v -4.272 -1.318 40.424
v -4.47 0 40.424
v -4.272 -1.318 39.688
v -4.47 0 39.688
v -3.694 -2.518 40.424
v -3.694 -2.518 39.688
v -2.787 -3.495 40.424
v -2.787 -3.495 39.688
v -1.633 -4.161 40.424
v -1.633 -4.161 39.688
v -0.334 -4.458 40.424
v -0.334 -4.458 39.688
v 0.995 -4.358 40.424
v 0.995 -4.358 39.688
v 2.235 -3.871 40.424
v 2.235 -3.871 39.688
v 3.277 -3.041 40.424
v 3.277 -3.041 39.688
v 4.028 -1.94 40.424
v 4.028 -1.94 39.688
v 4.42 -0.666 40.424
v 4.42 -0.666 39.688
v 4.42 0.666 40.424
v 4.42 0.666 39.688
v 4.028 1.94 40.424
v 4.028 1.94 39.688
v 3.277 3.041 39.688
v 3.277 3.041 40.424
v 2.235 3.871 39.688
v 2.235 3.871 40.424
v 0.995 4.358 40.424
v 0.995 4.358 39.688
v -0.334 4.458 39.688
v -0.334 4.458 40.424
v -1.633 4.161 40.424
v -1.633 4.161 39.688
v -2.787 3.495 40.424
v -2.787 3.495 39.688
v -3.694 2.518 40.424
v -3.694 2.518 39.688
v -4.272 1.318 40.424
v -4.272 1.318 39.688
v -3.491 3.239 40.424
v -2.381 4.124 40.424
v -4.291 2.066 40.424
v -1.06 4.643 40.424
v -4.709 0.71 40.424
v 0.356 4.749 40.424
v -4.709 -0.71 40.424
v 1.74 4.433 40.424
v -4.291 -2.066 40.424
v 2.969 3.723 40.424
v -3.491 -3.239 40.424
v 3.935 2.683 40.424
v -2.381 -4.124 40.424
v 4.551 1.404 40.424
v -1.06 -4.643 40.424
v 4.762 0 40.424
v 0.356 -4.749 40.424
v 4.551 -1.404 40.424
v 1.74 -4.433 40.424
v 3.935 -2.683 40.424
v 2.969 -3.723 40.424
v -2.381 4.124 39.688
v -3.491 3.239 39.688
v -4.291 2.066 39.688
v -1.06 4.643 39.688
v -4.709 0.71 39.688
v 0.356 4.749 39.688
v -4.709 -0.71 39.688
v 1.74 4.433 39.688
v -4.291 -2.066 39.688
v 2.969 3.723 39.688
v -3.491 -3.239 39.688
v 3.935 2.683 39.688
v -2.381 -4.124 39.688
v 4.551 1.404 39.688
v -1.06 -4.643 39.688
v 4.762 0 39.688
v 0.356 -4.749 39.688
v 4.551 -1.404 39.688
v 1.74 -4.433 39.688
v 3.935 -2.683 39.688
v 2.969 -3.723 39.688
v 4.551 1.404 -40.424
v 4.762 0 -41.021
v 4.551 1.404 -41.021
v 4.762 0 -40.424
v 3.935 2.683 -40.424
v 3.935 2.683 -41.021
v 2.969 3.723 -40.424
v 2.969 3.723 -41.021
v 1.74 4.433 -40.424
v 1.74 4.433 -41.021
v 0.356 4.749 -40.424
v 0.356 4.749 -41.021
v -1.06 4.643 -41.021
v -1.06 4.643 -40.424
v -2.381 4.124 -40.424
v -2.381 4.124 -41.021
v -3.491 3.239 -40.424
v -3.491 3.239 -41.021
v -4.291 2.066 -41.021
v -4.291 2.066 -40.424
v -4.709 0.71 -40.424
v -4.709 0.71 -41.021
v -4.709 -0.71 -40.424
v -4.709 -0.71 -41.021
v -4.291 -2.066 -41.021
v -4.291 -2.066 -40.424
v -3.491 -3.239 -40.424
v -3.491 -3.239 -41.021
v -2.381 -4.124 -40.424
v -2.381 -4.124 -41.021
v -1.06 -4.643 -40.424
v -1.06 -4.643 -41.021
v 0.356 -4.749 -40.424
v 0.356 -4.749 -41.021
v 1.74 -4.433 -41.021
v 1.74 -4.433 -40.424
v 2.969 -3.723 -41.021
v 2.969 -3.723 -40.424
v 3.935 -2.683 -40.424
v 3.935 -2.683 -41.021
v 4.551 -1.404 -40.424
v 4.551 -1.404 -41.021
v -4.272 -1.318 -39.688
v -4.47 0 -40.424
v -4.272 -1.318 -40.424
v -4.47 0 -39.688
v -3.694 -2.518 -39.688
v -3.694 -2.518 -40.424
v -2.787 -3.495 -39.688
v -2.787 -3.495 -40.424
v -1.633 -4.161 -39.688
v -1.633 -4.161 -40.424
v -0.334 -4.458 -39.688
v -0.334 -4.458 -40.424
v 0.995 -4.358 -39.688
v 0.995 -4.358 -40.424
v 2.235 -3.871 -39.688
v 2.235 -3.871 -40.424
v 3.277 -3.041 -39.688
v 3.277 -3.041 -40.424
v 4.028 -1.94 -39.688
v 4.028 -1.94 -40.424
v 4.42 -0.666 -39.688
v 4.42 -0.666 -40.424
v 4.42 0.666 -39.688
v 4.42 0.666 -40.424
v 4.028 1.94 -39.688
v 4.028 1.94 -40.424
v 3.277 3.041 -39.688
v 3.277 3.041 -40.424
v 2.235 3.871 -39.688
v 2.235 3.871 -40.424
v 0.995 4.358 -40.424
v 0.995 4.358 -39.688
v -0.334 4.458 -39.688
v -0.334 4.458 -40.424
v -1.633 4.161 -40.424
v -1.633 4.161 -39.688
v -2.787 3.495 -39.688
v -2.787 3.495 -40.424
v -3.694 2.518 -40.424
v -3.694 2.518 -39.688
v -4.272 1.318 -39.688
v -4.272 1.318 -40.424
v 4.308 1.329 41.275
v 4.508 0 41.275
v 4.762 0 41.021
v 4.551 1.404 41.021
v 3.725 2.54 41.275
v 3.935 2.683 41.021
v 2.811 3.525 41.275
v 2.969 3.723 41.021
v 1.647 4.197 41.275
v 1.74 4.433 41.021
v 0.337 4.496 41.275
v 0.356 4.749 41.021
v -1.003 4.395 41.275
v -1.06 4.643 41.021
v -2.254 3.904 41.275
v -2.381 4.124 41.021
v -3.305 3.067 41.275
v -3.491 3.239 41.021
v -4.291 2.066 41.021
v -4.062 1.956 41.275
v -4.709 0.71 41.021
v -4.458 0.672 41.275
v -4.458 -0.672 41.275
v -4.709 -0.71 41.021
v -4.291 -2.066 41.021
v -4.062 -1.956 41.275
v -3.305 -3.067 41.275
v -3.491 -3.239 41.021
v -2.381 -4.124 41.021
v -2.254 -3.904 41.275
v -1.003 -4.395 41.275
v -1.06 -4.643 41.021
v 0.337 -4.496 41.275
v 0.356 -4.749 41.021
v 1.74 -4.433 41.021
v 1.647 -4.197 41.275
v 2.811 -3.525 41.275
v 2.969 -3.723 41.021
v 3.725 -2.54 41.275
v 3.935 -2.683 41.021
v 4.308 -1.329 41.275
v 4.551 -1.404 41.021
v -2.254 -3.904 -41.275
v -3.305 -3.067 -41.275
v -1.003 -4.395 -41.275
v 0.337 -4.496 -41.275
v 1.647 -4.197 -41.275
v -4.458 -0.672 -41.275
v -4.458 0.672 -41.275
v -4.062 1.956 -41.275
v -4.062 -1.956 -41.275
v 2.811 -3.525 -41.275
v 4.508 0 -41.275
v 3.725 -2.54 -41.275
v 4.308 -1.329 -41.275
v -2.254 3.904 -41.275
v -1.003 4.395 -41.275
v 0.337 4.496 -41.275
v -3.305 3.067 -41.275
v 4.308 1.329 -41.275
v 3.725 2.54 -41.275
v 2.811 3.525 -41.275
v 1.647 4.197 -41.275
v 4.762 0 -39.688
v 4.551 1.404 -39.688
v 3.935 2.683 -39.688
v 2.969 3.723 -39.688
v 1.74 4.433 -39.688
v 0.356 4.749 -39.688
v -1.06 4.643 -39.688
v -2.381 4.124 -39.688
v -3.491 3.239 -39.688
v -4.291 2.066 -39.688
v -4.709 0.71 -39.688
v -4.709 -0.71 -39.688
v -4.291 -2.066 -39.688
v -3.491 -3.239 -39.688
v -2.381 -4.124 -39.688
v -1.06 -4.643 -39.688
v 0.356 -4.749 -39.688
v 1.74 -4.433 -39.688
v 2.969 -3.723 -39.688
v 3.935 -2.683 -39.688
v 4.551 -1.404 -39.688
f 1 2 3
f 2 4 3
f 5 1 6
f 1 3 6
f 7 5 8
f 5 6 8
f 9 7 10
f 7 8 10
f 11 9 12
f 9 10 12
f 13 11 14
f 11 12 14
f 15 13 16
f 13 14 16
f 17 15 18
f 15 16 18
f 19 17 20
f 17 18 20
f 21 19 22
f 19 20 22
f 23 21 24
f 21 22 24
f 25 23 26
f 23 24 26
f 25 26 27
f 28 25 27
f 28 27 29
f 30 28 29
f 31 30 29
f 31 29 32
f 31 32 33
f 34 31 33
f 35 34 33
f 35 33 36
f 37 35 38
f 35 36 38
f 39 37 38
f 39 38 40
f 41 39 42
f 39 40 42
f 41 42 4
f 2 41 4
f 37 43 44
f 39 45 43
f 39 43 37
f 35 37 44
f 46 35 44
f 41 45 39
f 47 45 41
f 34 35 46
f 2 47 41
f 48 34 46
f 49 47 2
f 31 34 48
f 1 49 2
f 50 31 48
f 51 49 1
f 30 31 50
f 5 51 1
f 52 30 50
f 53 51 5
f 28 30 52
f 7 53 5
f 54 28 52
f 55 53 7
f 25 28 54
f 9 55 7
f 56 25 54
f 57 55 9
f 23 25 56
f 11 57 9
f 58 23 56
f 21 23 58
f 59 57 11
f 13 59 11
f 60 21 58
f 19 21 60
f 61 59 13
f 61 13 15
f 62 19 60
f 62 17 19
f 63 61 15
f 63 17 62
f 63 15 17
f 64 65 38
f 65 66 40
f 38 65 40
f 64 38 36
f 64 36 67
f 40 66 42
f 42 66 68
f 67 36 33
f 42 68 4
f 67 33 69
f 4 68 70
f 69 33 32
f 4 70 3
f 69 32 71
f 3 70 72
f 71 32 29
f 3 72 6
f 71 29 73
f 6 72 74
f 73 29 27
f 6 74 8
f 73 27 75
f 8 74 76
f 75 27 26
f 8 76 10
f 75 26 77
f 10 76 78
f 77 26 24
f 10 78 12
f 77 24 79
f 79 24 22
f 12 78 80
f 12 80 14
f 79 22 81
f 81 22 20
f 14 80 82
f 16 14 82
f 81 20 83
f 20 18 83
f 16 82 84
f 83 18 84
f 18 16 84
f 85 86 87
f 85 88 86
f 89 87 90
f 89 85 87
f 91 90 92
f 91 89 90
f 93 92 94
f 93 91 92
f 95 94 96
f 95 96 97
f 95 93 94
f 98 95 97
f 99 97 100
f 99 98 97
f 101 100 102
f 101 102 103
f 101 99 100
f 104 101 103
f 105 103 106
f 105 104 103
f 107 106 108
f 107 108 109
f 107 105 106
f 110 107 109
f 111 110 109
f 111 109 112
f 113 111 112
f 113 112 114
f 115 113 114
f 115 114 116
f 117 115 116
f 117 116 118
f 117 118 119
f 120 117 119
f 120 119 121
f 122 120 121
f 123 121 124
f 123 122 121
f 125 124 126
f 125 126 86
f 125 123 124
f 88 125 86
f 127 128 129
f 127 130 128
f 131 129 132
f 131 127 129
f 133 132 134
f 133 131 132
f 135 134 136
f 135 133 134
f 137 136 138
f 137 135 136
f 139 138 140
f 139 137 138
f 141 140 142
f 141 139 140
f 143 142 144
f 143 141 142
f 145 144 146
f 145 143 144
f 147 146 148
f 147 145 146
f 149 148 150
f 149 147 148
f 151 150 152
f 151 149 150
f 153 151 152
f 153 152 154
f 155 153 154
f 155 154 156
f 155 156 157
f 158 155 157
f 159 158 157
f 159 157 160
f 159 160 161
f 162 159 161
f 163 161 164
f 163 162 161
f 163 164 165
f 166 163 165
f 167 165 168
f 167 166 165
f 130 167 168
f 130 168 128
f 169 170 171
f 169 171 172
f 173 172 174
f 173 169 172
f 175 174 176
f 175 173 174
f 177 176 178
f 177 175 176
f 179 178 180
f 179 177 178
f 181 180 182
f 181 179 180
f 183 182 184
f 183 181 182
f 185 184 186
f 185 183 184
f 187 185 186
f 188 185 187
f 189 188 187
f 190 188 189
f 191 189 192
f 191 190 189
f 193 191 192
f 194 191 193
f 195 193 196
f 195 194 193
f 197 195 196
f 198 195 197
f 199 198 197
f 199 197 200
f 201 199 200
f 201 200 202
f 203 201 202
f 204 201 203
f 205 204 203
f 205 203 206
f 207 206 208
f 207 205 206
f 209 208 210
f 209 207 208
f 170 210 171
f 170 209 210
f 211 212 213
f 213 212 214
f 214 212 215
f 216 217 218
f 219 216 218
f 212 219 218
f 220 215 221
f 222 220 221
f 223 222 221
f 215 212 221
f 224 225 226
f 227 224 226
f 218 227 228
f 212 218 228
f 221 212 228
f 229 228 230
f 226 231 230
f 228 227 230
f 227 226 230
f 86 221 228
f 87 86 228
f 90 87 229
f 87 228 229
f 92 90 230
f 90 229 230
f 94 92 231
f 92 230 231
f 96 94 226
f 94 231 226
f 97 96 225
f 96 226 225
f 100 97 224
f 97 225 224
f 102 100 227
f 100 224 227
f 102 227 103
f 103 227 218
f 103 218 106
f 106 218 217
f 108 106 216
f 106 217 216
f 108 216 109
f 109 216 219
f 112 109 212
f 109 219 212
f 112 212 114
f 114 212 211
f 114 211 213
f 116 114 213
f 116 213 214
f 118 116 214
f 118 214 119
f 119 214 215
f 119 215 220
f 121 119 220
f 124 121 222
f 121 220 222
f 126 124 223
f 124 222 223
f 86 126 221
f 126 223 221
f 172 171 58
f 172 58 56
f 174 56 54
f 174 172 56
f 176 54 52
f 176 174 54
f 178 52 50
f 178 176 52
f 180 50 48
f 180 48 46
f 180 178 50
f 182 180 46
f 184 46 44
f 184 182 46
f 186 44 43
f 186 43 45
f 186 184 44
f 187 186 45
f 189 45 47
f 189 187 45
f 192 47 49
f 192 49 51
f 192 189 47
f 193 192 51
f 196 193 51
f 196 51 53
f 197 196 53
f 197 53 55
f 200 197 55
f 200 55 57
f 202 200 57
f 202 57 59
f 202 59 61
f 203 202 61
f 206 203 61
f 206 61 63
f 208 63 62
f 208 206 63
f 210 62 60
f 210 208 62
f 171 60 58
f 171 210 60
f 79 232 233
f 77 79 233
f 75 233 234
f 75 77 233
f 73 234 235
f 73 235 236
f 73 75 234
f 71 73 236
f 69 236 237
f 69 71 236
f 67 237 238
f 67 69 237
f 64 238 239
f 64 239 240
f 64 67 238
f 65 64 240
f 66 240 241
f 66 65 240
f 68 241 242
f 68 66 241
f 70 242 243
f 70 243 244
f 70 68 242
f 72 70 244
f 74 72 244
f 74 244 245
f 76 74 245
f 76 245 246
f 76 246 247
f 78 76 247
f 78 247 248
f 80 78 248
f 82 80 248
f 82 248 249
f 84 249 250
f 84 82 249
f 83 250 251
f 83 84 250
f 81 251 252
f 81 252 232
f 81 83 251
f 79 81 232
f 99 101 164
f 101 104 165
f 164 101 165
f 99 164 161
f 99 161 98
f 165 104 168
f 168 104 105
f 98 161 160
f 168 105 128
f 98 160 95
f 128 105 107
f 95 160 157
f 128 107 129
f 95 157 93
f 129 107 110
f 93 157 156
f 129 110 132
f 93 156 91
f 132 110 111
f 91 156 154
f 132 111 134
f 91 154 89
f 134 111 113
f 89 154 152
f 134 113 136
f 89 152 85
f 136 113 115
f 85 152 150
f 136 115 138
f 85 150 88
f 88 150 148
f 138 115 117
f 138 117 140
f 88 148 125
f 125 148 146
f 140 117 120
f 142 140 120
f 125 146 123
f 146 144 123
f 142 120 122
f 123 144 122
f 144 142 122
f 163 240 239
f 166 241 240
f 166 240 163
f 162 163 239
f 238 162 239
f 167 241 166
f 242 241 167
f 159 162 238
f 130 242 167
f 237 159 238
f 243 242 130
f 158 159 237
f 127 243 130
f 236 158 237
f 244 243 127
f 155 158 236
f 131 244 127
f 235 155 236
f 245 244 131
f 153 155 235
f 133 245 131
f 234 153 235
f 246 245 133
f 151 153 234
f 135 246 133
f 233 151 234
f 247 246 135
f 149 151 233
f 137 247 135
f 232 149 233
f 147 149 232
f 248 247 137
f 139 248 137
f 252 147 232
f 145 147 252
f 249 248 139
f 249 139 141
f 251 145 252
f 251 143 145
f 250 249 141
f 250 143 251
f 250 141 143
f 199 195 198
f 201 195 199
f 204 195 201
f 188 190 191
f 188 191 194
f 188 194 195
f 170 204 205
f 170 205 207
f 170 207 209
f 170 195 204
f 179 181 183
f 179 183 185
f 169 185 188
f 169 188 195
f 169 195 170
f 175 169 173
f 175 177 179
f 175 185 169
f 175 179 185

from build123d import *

# Parameters (mm, degrees)
SKETCH1_R           = 4.7625
BOSS_EXTRUDE1_DEPTH = 41.275
SKETCH2_W           = 0.7366
SKETCH2_H           = 2.54
CHAMFER1_SIZE       = 0.254


with BuildPart() as part:
    # Sketch1 → Boss-Extrude1 (new, symmetric)
    with BuildSketch(Plane.XY):
        Circle(SKETCH1_R)
    extrude(amount=BOSS_EXTRUDE1_DEPTH, both=True)

    # Sketch2 → Cut-Revolve1 (revolve, cut)
    with BuildSketch(Plane(origin=(0, 0, 0), x_dir=(0, 0, -1), z_dir=(1, 0, 0)), mode=Mode.PRIVATE) as cut_revolve1_sk:
        with Locations((-40.0558, 5.7404)):
            Rectangle(SKETCH2_W, SKETCH2_H)
    cut_revolve1 = revolve(cut_revolve1_sk.sketch.rotate(Axis((0, 0, 0), (0, 0, 1)), 90), axis=Axis((0, 0, 0), (0, 0, 1)), mode=Mode.SUBTRACT)

    # Chamfer1
    chamfer1_edges = [part.edges().sort_by_distance(p)[0] for p in [
        (-4.7625, 0, -41.275),
        (-4.7625, 0, 41.275),
    ]]
    chamfer(chamfer1_edges, length=CHAMFER1_SIZE)

    # Mirror3: Cut-Revolve1 across plane
    add(cut_revolve1.mirror(Plane.XY), mode=Mode.SUBTRACT)


solid = part.part
